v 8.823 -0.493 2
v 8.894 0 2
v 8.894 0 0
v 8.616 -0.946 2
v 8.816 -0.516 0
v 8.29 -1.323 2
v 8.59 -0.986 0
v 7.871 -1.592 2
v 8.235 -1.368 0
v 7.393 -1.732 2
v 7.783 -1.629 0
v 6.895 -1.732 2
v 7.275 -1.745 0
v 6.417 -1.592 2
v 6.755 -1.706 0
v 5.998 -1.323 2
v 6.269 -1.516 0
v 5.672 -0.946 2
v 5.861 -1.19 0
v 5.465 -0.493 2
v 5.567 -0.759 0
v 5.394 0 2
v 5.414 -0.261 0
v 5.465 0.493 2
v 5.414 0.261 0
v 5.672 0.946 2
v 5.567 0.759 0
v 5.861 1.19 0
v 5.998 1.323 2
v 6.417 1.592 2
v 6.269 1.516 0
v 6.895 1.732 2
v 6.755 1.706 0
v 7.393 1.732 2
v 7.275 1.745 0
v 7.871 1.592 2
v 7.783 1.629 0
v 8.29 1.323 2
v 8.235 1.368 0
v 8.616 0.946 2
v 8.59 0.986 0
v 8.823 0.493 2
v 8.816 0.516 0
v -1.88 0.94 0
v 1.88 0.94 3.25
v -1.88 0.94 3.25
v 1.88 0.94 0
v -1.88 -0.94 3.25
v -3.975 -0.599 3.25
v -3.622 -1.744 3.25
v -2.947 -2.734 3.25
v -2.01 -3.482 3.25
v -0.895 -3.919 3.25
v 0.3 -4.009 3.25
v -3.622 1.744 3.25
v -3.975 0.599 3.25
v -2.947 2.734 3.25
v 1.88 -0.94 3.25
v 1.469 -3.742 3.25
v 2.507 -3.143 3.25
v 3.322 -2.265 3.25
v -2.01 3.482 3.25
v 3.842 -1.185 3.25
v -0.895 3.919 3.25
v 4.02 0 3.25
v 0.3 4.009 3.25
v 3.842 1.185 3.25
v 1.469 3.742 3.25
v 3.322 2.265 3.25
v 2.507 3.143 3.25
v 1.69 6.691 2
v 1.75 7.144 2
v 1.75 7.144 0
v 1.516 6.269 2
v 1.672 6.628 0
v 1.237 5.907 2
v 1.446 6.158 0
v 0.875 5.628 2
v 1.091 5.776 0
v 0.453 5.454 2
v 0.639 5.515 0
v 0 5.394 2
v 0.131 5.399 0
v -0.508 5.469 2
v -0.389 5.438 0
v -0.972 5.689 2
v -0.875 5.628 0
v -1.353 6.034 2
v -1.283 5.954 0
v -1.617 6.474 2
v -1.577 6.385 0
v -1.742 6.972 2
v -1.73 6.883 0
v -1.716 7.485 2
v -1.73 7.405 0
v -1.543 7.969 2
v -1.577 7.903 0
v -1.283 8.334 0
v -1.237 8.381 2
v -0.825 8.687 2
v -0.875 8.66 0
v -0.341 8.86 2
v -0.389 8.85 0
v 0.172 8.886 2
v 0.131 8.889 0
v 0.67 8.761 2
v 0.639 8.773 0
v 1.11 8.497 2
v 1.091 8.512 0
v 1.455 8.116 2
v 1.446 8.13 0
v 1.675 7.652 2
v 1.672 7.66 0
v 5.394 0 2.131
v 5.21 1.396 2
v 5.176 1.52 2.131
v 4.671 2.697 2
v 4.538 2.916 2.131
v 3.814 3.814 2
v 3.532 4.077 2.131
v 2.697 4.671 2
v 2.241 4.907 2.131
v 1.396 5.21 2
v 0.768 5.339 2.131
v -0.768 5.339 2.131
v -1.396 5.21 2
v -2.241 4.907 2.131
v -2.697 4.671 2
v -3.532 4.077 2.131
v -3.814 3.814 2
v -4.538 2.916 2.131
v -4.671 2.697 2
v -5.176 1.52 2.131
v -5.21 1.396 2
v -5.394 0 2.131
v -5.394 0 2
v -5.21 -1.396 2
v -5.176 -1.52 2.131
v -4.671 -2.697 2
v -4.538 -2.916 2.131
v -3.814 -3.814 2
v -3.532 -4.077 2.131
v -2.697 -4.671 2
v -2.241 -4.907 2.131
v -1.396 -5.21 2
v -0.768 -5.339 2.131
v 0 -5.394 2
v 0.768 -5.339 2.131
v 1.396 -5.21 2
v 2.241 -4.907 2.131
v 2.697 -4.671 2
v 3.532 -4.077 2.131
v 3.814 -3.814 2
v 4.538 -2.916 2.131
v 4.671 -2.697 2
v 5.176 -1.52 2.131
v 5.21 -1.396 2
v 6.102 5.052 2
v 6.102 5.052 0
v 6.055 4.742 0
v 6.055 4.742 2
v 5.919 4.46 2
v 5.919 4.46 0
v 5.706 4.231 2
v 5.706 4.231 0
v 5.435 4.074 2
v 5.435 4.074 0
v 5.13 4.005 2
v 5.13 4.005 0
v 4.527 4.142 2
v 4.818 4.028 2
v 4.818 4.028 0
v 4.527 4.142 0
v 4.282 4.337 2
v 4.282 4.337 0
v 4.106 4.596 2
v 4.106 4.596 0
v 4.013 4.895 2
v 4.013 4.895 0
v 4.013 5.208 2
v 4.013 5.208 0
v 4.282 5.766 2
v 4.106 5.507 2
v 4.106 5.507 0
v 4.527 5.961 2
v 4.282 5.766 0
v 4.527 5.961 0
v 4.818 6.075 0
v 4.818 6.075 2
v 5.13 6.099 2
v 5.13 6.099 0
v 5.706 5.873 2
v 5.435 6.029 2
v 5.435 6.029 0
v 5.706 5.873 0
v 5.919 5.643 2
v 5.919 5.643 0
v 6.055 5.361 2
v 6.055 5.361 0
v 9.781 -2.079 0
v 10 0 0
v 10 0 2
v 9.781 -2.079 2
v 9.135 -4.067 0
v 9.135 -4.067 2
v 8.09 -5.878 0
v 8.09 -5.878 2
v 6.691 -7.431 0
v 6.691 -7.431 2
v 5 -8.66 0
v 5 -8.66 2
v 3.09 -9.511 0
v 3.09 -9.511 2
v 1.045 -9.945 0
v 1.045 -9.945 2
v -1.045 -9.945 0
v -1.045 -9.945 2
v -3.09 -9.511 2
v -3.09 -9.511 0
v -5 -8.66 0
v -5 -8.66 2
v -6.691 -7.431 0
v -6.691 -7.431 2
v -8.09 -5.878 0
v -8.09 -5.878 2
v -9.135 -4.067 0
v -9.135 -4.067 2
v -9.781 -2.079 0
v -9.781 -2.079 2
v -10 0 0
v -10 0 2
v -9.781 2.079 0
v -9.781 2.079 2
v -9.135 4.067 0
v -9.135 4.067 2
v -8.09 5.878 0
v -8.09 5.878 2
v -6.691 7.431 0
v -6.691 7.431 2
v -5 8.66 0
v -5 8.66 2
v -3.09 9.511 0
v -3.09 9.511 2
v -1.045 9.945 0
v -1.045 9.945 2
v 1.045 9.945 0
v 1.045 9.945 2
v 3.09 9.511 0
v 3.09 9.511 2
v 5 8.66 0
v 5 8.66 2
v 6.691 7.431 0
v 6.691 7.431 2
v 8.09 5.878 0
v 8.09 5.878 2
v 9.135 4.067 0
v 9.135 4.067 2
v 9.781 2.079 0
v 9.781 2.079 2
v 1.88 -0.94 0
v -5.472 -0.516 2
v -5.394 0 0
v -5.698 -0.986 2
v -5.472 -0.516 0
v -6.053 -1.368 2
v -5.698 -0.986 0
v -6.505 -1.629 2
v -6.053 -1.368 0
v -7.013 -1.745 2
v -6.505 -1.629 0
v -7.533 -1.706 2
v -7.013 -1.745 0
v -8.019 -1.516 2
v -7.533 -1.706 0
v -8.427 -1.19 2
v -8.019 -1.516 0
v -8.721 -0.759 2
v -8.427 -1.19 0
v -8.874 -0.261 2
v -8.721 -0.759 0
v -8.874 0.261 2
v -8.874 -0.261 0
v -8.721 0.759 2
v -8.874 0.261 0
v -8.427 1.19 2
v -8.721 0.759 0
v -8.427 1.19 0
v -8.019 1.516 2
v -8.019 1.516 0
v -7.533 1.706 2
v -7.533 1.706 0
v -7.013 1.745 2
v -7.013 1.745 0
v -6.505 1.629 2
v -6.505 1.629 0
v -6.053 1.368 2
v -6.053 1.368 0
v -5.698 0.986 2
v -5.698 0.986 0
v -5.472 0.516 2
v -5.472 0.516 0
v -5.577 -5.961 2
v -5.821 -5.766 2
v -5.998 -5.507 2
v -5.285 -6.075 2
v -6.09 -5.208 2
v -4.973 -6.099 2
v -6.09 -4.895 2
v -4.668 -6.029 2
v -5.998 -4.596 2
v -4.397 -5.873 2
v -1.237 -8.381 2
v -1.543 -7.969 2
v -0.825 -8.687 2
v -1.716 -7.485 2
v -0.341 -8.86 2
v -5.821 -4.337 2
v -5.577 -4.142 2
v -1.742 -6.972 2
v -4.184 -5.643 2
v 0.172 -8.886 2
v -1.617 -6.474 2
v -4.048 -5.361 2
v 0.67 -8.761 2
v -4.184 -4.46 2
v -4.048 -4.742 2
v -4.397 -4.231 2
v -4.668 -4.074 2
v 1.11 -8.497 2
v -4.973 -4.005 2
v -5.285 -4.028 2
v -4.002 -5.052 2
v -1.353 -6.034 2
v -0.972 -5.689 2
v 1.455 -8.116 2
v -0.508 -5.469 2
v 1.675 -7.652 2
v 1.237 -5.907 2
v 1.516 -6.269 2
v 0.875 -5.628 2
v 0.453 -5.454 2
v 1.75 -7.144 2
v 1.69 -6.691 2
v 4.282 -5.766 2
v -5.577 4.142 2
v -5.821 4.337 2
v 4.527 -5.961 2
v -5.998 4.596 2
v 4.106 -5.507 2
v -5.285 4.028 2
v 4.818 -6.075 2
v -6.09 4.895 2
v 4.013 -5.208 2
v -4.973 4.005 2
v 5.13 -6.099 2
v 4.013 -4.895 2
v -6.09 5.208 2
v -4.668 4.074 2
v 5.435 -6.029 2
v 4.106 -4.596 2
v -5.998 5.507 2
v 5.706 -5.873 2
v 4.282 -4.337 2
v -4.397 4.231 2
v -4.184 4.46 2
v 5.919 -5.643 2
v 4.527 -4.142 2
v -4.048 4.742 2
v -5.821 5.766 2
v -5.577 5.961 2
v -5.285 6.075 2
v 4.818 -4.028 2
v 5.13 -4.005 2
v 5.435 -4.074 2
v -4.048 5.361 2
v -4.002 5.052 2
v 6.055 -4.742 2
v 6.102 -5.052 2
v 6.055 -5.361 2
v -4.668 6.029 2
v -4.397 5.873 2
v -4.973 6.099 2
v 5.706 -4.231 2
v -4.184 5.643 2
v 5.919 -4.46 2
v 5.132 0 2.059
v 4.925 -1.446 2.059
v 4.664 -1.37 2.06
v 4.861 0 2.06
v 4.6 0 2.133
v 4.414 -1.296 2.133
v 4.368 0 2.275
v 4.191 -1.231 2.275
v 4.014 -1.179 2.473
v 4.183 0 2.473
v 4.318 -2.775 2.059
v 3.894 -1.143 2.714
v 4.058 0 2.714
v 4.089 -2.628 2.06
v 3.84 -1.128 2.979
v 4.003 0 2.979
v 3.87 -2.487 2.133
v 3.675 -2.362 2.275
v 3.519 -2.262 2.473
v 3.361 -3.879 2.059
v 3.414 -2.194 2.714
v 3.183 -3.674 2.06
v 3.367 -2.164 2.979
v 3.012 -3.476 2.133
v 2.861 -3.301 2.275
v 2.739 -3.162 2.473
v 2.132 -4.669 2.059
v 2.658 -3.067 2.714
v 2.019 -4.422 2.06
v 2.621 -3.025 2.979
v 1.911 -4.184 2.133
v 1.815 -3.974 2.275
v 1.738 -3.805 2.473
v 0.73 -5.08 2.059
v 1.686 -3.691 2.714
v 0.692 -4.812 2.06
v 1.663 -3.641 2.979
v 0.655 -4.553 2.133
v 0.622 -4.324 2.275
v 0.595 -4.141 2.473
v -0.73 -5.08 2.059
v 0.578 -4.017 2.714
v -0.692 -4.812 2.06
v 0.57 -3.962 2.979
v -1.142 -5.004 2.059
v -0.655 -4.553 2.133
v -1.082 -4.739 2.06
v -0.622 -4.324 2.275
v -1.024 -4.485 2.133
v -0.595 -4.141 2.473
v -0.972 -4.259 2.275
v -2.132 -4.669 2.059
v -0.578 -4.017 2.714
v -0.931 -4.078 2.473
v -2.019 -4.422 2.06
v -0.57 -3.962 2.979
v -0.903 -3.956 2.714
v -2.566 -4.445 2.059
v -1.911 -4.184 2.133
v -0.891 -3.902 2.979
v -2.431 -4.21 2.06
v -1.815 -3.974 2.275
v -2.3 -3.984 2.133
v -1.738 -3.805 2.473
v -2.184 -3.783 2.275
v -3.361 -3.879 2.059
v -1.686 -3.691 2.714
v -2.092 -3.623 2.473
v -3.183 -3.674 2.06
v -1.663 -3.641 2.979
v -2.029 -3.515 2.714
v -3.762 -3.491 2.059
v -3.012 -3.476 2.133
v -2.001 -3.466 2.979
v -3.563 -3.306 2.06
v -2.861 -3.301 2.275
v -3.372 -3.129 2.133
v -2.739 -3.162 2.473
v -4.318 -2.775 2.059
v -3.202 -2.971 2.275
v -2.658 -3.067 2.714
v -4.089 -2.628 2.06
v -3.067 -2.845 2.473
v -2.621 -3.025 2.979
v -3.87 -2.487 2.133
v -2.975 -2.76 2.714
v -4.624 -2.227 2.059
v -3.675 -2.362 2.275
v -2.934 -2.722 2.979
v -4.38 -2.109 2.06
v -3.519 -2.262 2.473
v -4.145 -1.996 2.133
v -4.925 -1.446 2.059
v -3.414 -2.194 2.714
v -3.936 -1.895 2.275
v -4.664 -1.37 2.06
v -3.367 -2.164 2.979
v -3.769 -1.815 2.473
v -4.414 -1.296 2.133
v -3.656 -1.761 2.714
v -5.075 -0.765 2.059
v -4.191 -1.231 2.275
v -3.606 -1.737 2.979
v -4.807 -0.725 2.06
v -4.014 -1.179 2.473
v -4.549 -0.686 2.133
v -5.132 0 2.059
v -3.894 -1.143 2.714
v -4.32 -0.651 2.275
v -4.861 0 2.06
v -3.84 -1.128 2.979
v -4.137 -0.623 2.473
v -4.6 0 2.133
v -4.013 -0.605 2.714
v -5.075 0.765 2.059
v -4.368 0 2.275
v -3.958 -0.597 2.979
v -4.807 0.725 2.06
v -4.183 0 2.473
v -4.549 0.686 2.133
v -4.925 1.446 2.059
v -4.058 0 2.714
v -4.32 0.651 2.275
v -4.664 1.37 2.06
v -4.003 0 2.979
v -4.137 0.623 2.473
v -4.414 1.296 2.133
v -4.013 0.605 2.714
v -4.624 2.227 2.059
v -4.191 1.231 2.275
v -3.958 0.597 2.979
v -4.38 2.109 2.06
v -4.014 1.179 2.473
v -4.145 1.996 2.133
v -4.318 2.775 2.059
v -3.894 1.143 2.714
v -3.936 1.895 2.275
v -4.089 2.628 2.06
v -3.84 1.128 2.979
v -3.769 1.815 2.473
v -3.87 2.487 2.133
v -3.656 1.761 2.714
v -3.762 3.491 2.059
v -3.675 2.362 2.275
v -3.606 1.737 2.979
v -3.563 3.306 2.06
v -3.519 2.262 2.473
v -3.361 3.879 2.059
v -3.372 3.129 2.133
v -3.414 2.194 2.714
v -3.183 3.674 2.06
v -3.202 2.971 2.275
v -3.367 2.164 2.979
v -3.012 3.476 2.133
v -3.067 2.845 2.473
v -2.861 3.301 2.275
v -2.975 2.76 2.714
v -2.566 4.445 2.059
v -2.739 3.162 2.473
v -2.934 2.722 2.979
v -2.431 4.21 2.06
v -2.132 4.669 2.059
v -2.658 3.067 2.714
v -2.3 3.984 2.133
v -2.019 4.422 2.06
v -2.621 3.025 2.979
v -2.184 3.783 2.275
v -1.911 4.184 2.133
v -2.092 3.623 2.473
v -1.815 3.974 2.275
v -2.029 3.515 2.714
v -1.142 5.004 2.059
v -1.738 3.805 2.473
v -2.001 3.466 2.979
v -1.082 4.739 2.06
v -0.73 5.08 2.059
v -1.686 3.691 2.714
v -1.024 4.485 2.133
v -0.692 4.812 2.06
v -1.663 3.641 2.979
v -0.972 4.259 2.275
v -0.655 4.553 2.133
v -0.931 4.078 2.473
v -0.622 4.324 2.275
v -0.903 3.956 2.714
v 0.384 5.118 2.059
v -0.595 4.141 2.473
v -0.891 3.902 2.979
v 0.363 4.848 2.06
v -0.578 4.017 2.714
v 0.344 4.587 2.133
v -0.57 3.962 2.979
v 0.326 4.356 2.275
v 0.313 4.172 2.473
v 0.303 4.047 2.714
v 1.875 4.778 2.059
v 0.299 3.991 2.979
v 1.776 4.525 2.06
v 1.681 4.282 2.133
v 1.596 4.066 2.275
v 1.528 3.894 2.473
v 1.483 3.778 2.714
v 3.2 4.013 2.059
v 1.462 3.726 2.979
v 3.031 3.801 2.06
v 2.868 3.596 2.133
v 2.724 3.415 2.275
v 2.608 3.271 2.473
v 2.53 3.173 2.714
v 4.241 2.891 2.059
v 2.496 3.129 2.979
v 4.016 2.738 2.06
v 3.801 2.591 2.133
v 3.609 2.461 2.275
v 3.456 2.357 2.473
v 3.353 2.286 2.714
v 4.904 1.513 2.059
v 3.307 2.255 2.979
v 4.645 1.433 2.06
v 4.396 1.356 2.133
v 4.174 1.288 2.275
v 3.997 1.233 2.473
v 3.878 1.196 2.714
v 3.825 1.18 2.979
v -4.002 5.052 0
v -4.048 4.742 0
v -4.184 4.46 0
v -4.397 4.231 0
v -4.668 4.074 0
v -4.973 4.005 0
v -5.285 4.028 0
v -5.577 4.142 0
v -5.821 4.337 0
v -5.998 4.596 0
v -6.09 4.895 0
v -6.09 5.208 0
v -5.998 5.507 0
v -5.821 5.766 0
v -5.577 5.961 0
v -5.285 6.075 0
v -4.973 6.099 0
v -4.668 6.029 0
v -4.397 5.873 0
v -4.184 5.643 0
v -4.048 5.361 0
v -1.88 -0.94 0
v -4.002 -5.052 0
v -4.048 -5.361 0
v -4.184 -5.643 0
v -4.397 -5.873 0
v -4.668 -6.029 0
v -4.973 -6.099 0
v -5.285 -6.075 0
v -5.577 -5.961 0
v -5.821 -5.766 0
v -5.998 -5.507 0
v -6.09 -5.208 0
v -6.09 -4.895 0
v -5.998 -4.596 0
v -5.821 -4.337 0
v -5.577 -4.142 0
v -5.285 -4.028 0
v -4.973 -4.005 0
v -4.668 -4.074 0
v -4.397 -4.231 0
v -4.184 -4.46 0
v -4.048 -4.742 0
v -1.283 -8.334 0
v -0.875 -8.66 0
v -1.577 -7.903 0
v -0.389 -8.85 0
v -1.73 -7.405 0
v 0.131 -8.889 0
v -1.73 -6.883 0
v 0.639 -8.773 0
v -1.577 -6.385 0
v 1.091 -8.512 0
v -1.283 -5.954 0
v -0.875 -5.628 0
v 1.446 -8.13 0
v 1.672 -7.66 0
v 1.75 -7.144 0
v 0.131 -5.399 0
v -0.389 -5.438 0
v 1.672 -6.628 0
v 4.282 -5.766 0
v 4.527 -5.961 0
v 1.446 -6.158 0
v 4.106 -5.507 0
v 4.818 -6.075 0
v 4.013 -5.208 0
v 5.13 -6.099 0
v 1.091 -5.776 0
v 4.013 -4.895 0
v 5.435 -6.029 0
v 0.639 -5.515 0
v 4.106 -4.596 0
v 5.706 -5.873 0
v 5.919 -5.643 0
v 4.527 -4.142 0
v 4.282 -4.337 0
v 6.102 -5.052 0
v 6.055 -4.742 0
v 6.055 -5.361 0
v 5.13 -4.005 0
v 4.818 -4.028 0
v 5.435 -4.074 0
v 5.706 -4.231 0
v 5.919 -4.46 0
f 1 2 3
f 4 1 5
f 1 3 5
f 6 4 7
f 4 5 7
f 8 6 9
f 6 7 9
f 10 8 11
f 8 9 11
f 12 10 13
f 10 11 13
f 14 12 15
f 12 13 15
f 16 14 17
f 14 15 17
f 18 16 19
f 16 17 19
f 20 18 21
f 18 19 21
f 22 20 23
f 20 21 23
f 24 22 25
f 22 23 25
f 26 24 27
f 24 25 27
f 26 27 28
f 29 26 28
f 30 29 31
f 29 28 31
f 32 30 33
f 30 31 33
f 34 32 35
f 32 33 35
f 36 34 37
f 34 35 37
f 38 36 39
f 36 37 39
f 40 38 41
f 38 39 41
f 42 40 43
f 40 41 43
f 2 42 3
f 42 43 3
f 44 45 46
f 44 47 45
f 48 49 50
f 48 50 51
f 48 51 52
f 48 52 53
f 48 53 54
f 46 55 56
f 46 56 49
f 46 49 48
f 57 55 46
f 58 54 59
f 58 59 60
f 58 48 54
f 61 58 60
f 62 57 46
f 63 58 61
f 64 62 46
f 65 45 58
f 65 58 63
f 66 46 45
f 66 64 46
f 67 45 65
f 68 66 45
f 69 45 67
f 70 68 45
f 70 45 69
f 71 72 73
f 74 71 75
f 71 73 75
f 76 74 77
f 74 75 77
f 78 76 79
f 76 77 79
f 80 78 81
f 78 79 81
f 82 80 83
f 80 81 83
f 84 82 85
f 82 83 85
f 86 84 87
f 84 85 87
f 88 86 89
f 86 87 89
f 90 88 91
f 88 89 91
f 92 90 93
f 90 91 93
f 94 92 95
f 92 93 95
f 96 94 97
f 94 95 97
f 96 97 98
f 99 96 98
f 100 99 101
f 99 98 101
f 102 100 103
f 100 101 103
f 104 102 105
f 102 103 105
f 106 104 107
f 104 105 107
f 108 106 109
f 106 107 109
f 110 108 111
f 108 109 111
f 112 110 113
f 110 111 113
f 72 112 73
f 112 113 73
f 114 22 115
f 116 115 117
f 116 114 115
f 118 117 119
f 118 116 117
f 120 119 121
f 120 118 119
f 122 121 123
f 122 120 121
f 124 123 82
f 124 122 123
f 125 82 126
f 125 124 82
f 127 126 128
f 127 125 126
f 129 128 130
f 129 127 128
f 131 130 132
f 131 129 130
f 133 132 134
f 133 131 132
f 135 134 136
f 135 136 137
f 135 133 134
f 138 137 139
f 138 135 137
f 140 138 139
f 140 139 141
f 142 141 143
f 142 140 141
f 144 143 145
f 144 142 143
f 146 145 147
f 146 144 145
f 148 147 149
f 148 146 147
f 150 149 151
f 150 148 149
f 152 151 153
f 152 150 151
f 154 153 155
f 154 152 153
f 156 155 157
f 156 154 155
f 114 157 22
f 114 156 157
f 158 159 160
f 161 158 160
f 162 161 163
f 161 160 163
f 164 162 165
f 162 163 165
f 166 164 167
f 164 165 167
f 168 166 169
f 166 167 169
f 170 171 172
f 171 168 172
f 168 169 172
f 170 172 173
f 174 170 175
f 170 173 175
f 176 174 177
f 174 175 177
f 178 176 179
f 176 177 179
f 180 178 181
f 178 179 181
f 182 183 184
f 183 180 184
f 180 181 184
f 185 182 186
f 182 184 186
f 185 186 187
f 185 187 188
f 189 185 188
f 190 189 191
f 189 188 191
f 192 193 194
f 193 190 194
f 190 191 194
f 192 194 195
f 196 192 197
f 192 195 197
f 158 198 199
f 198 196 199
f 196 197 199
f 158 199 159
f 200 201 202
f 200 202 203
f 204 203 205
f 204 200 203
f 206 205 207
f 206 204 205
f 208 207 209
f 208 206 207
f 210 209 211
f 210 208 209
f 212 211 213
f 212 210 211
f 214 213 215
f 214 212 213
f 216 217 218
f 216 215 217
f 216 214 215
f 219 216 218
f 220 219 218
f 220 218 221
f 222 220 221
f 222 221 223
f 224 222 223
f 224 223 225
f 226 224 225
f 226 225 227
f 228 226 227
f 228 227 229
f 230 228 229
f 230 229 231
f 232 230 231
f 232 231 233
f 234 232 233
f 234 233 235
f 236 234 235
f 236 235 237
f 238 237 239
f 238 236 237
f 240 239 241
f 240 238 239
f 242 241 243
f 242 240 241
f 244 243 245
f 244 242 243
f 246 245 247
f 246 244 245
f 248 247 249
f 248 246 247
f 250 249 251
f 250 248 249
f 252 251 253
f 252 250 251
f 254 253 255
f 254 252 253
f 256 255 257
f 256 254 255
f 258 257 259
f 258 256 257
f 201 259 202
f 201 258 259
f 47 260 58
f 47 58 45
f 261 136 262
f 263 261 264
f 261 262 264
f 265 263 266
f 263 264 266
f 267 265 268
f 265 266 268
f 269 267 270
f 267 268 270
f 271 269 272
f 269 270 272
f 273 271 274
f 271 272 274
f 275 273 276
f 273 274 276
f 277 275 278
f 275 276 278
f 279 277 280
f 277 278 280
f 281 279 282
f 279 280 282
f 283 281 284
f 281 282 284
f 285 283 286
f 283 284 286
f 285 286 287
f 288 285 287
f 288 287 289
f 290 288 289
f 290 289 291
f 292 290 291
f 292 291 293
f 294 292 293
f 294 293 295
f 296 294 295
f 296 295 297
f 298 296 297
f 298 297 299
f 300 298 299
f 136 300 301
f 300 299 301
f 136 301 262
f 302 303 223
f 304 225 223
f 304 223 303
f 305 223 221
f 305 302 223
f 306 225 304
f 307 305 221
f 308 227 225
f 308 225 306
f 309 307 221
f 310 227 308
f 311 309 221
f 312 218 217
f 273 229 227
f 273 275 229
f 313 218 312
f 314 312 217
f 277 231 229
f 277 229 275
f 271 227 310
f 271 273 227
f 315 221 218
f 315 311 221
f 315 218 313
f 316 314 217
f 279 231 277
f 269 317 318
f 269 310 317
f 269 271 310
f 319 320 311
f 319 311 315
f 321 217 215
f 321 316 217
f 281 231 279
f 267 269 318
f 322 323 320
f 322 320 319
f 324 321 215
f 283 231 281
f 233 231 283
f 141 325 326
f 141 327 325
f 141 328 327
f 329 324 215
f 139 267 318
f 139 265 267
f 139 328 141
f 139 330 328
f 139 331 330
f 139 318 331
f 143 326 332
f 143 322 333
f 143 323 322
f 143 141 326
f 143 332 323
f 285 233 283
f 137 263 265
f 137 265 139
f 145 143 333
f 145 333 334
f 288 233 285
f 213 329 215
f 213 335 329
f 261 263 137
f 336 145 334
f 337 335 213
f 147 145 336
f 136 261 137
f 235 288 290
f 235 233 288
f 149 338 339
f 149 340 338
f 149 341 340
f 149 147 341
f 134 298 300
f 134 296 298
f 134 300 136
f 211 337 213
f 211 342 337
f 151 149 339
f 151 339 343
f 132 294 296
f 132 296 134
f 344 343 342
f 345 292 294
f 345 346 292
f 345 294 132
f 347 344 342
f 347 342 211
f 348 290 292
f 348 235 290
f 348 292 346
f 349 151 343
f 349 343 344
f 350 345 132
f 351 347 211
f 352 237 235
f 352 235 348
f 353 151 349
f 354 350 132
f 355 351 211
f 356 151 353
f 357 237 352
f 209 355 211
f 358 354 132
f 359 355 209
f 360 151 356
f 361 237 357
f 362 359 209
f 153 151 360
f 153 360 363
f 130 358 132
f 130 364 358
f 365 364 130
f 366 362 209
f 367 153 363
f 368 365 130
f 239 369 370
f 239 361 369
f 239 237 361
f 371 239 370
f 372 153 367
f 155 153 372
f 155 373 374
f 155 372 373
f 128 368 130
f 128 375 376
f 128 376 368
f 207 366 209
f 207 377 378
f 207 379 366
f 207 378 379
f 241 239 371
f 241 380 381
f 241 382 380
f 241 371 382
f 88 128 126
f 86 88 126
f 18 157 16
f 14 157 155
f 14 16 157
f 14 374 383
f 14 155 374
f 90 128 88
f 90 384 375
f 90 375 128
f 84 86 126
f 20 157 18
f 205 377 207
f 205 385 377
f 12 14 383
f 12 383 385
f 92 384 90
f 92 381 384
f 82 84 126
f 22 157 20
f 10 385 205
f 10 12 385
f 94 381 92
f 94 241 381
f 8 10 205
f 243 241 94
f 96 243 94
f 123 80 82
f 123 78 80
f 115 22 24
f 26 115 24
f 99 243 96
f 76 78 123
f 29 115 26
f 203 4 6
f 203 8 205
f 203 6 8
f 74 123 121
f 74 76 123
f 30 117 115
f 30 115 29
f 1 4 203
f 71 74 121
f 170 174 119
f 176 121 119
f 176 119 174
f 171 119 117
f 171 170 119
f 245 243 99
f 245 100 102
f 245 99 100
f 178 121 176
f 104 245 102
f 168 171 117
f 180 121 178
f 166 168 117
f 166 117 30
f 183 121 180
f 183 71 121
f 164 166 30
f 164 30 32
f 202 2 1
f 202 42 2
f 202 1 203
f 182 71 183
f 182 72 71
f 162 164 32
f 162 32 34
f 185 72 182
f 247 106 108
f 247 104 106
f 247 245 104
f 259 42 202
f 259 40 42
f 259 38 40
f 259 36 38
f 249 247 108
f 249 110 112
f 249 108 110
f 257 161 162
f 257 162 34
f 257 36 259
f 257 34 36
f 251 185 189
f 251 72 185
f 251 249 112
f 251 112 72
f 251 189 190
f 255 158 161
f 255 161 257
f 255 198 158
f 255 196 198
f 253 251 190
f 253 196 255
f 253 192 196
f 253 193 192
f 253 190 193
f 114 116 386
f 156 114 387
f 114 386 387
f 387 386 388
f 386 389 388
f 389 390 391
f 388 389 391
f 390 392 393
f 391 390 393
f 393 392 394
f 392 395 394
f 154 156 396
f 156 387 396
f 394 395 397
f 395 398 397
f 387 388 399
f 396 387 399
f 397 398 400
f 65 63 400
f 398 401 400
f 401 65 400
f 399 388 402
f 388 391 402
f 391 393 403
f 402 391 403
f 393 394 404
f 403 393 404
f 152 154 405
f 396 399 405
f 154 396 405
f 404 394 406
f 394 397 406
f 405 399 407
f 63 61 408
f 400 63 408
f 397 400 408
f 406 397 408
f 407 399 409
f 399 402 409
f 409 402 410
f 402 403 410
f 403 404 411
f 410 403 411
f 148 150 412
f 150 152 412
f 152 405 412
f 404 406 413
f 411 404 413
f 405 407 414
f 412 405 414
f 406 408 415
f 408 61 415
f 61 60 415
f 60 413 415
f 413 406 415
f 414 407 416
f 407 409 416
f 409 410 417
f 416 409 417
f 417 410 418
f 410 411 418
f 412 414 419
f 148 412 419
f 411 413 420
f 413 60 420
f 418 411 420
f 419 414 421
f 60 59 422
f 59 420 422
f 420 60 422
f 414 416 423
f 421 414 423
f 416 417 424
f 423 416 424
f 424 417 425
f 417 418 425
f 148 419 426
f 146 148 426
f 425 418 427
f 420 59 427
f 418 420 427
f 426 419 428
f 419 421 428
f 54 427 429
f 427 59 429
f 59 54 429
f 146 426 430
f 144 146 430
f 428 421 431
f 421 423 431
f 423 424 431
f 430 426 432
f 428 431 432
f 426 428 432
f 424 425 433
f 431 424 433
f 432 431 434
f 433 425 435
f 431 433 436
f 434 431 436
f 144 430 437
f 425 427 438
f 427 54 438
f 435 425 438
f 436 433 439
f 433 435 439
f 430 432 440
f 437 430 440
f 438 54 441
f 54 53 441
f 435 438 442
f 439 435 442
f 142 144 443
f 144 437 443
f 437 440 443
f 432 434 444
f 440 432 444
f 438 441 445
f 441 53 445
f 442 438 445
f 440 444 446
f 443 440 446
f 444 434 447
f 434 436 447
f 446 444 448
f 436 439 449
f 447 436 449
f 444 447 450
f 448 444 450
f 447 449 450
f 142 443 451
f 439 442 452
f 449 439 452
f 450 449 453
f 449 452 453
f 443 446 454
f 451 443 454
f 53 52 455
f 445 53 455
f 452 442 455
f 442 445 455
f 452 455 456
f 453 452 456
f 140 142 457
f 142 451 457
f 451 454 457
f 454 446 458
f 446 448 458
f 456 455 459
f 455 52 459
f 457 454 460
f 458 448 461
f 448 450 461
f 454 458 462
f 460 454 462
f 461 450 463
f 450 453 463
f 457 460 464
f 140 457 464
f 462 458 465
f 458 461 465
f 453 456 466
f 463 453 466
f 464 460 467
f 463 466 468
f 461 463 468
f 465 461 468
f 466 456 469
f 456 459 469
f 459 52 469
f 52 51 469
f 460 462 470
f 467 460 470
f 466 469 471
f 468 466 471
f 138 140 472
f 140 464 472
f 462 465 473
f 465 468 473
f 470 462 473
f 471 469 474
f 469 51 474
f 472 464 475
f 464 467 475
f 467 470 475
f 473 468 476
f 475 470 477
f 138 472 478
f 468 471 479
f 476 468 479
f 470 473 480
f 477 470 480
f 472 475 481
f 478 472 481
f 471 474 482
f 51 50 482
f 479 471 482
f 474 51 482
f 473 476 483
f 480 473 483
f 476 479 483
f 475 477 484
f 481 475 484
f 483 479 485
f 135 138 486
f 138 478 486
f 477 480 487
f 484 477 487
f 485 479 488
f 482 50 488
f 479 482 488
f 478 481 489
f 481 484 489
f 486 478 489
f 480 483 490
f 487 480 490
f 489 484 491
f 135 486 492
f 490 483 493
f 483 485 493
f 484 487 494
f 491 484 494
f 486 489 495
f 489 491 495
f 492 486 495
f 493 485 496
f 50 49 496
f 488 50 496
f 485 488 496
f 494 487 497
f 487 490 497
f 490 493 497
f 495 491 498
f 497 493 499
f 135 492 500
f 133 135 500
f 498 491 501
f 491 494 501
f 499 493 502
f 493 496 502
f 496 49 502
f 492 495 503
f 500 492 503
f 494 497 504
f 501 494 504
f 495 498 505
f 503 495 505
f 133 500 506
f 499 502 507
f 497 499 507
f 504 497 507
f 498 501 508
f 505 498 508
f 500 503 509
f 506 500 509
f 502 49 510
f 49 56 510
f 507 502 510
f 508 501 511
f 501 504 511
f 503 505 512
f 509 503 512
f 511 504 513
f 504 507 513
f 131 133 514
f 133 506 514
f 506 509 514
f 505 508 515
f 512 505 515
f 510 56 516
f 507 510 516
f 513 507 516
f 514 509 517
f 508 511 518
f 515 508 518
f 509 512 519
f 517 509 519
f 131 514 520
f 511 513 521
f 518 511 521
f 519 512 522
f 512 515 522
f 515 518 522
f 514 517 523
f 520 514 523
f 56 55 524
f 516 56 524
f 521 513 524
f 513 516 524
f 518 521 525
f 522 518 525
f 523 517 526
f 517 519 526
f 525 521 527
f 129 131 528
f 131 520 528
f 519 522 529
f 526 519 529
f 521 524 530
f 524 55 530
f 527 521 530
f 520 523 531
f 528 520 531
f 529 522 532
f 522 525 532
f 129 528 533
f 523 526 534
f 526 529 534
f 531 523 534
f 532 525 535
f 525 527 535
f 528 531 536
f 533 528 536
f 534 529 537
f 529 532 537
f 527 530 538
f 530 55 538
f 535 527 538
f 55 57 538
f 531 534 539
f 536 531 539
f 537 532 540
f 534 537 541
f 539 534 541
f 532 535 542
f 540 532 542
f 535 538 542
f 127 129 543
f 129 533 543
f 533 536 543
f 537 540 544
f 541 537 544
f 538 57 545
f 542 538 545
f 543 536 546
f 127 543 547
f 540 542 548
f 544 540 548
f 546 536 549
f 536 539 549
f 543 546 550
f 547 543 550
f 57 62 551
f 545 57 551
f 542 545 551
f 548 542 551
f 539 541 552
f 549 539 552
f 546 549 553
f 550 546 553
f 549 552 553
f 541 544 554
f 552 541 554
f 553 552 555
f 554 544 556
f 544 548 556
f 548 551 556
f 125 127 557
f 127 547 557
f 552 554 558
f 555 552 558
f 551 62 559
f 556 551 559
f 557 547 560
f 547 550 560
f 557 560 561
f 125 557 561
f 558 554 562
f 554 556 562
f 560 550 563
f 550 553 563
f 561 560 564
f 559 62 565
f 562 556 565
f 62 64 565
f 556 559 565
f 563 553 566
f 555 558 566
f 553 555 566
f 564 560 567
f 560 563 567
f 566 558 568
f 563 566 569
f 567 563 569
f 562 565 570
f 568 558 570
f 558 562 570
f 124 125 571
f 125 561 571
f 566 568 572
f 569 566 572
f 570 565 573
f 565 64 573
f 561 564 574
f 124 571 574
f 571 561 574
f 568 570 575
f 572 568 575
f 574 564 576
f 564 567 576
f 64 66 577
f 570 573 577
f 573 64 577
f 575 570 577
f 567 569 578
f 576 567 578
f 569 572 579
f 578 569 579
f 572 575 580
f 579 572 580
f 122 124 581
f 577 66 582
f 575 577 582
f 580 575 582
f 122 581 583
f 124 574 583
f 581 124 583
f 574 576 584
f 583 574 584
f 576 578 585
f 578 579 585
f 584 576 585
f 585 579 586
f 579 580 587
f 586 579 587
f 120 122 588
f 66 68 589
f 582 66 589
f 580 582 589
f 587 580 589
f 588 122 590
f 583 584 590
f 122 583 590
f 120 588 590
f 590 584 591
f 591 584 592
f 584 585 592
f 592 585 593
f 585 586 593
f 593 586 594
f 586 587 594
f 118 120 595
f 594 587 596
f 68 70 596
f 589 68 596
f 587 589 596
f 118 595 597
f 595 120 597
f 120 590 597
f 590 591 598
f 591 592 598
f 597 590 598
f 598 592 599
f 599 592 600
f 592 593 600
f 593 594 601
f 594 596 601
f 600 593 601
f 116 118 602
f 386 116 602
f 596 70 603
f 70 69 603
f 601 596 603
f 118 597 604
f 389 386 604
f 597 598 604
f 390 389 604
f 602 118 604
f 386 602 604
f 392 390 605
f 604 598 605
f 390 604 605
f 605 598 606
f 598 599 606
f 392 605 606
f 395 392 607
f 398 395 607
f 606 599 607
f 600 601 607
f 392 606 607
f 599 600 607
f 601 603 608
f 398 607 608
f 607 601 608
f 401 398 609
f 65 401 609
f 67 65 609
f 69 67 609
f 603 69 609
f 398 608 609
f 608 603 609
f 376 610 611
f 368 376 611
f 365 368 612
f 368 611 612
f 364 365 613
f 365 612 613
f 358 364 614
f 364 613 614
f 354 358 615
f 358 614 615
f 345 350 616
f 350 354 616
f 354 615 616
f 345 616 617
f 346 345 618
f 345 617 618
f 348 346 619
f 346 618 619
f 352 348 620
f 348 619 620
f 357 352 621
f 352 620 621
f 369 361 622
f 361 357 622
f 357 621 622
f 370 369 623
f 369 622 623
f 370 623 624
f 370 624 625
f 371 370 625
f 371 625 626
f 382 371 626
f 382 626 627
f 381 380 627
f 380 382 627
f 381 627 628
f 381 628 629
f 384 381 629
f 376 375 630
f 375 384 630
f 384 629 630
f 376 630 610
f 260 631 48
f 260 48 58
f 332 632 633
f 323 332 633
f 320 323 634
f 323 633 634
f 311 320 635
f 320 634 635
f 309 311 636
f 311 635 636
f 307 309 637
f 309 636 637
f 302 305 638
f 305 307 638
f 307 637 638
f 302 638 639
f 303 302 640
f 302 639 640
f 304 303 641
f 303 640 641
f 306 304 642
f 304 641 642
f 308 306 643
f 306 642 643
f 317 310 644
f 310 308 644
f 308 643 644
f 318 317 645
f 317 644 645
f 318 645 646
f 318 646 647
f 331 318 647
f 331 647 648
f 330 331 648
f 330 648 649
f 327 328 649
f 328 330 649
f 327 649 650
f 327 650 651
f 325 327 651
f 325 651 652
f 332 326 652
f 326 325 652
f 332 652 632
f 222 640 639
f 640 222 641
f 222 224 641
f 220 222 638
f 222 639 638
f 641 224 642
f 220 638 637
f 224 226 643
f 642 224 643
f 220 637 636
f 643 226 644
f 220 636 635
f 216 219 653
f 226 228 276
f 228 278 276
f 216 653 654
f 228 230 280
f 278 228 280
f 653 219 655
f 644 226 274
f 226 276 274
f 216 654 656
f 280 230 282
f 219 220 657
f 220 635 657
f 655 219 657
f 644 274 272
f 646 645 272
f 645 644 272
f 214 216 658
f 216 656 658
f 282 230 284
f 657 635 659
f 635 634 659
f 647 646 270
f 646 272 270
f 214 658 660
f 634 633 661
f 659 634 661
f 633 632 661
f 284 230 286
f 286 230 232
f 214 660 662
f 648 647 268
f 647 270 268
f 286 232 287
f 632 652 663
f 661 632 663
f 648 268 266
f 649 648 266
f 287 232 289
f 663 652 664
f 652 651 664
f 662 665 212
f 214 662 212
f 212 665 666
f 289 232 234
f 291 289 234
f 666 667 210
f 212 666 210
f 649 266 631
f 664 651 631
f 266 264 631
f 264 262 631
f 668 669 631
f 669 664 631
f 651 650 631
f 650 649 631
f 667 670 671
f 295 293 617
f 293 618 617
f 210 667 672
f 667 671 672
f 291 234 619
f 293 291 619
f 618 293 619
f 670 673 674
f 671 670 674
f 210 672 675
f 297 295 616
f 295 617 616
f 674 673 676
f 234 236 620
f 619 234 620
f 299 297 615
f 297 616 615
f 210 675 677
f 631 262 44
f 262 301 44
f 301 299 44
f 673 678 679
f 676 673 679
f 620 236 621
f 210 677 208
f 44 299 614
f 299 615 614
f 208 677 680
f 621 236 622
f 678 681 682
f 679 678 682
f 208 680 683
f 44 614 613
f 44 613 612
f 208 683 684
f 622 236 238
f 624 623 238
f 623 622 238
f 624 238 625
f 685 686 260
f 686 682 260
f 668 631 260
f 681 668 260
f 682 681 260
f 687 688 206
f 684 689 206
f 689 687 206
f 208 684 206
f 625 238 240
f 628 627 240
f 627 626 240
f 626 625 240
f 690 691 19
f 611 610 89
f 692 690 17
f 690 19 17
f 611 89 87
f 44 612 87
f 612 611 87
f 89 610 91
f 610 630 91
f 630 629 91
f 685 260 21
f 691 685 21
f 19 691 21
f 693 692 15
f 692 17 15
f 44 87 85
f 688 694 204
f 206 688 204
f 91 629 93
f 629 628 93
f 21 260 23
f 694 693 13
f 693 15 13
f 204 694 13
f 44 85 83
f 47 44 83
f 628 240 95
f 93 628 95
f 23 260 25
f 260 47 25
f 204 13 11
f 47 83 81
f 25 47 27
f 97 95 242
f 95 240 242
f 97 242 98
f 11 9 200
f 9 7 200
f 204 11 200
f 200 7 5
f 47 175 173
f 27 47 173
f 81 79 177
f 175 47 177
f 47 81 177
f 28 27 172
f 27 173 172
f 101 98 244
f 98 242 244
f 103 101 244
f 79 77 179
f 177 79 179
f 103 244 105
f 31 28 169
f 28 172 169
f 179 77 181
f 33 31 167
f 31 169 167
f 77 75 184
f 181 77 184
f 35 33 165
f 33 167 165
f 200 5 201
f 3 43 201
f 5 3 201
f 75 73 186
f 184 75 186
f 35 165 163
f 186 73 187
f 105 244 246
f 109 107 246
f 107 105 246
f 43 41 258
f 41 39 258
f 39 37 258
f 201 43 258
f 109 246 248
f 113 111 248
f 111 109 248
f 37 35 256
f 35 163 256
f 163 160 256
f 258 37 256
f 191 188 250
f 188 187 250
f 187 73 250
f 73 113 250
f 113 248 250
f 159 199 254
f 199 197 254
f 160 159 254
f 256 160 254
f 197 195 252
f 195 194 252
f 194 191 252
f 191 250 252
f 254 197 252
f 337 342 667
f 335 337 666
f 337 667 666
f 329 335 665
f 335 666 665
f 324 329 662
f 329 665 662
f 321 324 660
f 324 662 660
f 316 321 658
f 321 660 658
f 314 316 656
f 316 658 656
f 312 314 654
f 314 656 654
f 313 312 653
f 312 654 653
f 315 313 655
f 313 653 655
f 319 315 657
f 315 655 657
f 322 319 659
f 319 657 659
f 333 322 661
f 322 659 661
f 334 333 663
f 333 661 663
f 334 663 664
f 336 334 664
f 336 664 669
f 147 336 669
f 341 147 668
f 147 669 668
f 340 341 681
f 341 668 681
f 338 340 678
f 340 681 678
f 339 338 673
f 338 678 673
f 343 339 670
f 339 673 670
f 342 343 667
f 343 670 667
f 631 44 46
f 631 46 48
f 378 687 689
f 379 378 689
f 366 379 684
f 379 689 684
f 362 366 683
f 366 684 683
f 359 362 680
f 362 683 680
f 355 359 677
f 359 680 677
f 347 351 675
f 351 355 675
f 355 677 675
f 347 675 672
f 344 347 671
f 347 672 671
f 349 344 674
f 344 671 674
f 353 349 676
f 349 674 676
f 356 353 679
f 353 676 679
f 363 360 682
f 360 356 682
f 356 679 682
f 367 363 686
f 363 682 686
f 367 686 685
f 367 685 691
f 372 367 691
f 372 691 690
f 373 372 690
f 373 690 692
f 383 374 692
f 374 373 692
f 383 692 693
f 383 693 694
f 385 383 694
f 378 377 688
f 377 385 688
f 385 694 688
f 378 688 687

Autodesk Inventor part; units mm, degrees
ref_plane "YZ Plane" through (0, 0, 0) normal (1, 0, 0) x (0, 1, 0)
ref_plane "XZ Plane" through (0, 0, 0) normal (0, 1, 0) x (-1, 0, 0)
ref_plane "XY Plane" through (0, 0, 0) normal (0, 0, 1) x (1, 0, 0)
sketch "Endflansch" plane through (0, 0, 0) normal (0, 0, 1) x (1, 0, 0)
  circle A0 centre (0, 0) radius 10
  line L0 (0, 14) -> (0, -14) construction
  line L1 (-14, 0) -> (14, 0) construction
  line L2 (-1.8795, -0.94) -> (1.8795, -0.94)
  line L3 (1.8795, -0.94) -> (1.8795, 0.94)
  line L4 (1.8795, 0.94) -> (-1.8795, 0.94)
  line L5 (-1.8795, 0.94) -> (-1.8795, -0.94)
  line L6 (-1.8795, -0.94) -> (1.8795, 0.94) construction
  line L7 (1.8795, -0.94) -> (-1.8795, 0.94) construction
  circle A1 centre (0, 7.144) radius 1.75
  line L8 (0, 0) -> (9.8265, 9.8265) construction
  circle A2 centre (5.0516, 5.0516) radius 1.05
  circle A3 centre (0, 0) radius 7.144 construction
  circle A4 centre (0, 0) radius 3.865
  circle A5 centre (-7.144, 0) radius 1.75
  circle A6 centre (-5.0516, 5.0516) radius 1.05
  circle A7 centre (0, -7.144) radius 1.75
  circle A8 centre (-5.0516, -5.0516) radius 1.05
  circle A9 centre (7.144, 0) radius 1.75
  circle A10 centre (5.0516, -5.0516) radius 1.05
  dimension "d1" = 20
  dimension "d3" = 1.88
  dimension "d4" = 3.759
  dimension "d5" = 90
  dimension "d7" = 3.5
  dimension "d8" = 45
  dimension "d9" = 2.1
  dimension "d10" = 7.144
  dimension "d14" = 360
  dimension "d20" = 7.73
extrude "Extrusion1" add sketch "Endflansch" along normal blind 2 contours A0 | A4
extrude "Extrusion2" add sketch "Endflansch" along normal blind 1.25 from surface at 2 contours A4
sketch "Skizze2" plane through (0, 0, 0) normal (0, 1, 0) x (-1, 0, 0)
  line L0 (3.865, 3.25) -> (3.865, 2) projected
  line L1 (3.865, 2) -> (5.394, 2) projected
  line L2 (5.394, 2) -> (5.394, 0) projected
  line L3 (5.394, 0) -> (1.8795, 0) projected
  line L4 (1.8795, 0) -> (1.8795, 3.25) projected
  line L5 (1.8795, 3.25) -> (3.865, 3.25) projected
  line L6 (-1.8795, 3.25) -> (-1.8795, 0) projected
  line L7 (-1.8795, 0) -> (-5.394, 0) projected
  line L8 (-5.394, 0) -> (-5.394, 2) projected
  line L9 (-5.394, 2) -> (-3.865, 2) projected
  line L10 (-3.865, 2) -> (-3.865, 3.25) projected
  line L11 (-3.865, 3.25) -> (-1.8795, 3.25) projected
  line L12 (10, 0) -> (8.894, 0) projected
  line L13 (8.894, 0) -> (8.894, 2) projected
  line L14 (8.894, 2) -> (10, 2) projected
  line L15 (10, 2) -> (10, 0) projected
  line L16 (-8.894, 0) -> (-10, 0) projected
  line L17 (-10, 0) -> (-10, 2) projected
  line L18 (-10, 2) -> (-8.894, 2) projected
  line L19 (-8.894, 2) -> (-8.894, 0) projected
  line L20 (0, -0.96) -> (0, 5.76) construction
  circle A0 centre (-5, 3.05) radius 1
  line L21 (-3.865, 3.25) -> (-4.0202, 3.25)
  line L22 (-3.865, 2) -> (-3.865, 3.25) construction
  line L23 (-8.894, 2) -> (-5.394, 2) construction
  line L24 (-5.394, 2) -> (-5.394, 2.1309)
  point P0 (0, 0)
  dimension "d21" = 2
  dimension "d22" = 5
  dimension "d28" = 0.2
revolve "Umdrehung1" add sketch "Skizze2" angle 360 about axis through (0, 0, -10) along (0, 0, 1) contours L10 L9 L24 A0 L21
extrude "Extrusion3" [suppressed]
equation "\"d3\" = Hohlleiter_b"
equation "\"d4\" = Hohlleiter_h"
equation "\"d7\" = Bohrung_IHF_Schraube"
equation "\"d9\" = Bohrung_IHF_Passstift"
equation "\"d20\" = Hohlleiter_Erhebung_d"
equation "\"Hohlleiter_h\" = 3.759"
equation "\"Hohlleiter_b\" = 1.88"
equation "\"Hohlleiter_Orientation\" = 0"
equation "\"Bohrung_IHF_Schraube\" = 3.5"
equation "\"Bohrung_IHF_Passstift\" = 2.1"
equation "\"Hohlleiter_Erhebung_d\" = 7.73"
properties part number "Hohlleiter-EndflanschV5"
